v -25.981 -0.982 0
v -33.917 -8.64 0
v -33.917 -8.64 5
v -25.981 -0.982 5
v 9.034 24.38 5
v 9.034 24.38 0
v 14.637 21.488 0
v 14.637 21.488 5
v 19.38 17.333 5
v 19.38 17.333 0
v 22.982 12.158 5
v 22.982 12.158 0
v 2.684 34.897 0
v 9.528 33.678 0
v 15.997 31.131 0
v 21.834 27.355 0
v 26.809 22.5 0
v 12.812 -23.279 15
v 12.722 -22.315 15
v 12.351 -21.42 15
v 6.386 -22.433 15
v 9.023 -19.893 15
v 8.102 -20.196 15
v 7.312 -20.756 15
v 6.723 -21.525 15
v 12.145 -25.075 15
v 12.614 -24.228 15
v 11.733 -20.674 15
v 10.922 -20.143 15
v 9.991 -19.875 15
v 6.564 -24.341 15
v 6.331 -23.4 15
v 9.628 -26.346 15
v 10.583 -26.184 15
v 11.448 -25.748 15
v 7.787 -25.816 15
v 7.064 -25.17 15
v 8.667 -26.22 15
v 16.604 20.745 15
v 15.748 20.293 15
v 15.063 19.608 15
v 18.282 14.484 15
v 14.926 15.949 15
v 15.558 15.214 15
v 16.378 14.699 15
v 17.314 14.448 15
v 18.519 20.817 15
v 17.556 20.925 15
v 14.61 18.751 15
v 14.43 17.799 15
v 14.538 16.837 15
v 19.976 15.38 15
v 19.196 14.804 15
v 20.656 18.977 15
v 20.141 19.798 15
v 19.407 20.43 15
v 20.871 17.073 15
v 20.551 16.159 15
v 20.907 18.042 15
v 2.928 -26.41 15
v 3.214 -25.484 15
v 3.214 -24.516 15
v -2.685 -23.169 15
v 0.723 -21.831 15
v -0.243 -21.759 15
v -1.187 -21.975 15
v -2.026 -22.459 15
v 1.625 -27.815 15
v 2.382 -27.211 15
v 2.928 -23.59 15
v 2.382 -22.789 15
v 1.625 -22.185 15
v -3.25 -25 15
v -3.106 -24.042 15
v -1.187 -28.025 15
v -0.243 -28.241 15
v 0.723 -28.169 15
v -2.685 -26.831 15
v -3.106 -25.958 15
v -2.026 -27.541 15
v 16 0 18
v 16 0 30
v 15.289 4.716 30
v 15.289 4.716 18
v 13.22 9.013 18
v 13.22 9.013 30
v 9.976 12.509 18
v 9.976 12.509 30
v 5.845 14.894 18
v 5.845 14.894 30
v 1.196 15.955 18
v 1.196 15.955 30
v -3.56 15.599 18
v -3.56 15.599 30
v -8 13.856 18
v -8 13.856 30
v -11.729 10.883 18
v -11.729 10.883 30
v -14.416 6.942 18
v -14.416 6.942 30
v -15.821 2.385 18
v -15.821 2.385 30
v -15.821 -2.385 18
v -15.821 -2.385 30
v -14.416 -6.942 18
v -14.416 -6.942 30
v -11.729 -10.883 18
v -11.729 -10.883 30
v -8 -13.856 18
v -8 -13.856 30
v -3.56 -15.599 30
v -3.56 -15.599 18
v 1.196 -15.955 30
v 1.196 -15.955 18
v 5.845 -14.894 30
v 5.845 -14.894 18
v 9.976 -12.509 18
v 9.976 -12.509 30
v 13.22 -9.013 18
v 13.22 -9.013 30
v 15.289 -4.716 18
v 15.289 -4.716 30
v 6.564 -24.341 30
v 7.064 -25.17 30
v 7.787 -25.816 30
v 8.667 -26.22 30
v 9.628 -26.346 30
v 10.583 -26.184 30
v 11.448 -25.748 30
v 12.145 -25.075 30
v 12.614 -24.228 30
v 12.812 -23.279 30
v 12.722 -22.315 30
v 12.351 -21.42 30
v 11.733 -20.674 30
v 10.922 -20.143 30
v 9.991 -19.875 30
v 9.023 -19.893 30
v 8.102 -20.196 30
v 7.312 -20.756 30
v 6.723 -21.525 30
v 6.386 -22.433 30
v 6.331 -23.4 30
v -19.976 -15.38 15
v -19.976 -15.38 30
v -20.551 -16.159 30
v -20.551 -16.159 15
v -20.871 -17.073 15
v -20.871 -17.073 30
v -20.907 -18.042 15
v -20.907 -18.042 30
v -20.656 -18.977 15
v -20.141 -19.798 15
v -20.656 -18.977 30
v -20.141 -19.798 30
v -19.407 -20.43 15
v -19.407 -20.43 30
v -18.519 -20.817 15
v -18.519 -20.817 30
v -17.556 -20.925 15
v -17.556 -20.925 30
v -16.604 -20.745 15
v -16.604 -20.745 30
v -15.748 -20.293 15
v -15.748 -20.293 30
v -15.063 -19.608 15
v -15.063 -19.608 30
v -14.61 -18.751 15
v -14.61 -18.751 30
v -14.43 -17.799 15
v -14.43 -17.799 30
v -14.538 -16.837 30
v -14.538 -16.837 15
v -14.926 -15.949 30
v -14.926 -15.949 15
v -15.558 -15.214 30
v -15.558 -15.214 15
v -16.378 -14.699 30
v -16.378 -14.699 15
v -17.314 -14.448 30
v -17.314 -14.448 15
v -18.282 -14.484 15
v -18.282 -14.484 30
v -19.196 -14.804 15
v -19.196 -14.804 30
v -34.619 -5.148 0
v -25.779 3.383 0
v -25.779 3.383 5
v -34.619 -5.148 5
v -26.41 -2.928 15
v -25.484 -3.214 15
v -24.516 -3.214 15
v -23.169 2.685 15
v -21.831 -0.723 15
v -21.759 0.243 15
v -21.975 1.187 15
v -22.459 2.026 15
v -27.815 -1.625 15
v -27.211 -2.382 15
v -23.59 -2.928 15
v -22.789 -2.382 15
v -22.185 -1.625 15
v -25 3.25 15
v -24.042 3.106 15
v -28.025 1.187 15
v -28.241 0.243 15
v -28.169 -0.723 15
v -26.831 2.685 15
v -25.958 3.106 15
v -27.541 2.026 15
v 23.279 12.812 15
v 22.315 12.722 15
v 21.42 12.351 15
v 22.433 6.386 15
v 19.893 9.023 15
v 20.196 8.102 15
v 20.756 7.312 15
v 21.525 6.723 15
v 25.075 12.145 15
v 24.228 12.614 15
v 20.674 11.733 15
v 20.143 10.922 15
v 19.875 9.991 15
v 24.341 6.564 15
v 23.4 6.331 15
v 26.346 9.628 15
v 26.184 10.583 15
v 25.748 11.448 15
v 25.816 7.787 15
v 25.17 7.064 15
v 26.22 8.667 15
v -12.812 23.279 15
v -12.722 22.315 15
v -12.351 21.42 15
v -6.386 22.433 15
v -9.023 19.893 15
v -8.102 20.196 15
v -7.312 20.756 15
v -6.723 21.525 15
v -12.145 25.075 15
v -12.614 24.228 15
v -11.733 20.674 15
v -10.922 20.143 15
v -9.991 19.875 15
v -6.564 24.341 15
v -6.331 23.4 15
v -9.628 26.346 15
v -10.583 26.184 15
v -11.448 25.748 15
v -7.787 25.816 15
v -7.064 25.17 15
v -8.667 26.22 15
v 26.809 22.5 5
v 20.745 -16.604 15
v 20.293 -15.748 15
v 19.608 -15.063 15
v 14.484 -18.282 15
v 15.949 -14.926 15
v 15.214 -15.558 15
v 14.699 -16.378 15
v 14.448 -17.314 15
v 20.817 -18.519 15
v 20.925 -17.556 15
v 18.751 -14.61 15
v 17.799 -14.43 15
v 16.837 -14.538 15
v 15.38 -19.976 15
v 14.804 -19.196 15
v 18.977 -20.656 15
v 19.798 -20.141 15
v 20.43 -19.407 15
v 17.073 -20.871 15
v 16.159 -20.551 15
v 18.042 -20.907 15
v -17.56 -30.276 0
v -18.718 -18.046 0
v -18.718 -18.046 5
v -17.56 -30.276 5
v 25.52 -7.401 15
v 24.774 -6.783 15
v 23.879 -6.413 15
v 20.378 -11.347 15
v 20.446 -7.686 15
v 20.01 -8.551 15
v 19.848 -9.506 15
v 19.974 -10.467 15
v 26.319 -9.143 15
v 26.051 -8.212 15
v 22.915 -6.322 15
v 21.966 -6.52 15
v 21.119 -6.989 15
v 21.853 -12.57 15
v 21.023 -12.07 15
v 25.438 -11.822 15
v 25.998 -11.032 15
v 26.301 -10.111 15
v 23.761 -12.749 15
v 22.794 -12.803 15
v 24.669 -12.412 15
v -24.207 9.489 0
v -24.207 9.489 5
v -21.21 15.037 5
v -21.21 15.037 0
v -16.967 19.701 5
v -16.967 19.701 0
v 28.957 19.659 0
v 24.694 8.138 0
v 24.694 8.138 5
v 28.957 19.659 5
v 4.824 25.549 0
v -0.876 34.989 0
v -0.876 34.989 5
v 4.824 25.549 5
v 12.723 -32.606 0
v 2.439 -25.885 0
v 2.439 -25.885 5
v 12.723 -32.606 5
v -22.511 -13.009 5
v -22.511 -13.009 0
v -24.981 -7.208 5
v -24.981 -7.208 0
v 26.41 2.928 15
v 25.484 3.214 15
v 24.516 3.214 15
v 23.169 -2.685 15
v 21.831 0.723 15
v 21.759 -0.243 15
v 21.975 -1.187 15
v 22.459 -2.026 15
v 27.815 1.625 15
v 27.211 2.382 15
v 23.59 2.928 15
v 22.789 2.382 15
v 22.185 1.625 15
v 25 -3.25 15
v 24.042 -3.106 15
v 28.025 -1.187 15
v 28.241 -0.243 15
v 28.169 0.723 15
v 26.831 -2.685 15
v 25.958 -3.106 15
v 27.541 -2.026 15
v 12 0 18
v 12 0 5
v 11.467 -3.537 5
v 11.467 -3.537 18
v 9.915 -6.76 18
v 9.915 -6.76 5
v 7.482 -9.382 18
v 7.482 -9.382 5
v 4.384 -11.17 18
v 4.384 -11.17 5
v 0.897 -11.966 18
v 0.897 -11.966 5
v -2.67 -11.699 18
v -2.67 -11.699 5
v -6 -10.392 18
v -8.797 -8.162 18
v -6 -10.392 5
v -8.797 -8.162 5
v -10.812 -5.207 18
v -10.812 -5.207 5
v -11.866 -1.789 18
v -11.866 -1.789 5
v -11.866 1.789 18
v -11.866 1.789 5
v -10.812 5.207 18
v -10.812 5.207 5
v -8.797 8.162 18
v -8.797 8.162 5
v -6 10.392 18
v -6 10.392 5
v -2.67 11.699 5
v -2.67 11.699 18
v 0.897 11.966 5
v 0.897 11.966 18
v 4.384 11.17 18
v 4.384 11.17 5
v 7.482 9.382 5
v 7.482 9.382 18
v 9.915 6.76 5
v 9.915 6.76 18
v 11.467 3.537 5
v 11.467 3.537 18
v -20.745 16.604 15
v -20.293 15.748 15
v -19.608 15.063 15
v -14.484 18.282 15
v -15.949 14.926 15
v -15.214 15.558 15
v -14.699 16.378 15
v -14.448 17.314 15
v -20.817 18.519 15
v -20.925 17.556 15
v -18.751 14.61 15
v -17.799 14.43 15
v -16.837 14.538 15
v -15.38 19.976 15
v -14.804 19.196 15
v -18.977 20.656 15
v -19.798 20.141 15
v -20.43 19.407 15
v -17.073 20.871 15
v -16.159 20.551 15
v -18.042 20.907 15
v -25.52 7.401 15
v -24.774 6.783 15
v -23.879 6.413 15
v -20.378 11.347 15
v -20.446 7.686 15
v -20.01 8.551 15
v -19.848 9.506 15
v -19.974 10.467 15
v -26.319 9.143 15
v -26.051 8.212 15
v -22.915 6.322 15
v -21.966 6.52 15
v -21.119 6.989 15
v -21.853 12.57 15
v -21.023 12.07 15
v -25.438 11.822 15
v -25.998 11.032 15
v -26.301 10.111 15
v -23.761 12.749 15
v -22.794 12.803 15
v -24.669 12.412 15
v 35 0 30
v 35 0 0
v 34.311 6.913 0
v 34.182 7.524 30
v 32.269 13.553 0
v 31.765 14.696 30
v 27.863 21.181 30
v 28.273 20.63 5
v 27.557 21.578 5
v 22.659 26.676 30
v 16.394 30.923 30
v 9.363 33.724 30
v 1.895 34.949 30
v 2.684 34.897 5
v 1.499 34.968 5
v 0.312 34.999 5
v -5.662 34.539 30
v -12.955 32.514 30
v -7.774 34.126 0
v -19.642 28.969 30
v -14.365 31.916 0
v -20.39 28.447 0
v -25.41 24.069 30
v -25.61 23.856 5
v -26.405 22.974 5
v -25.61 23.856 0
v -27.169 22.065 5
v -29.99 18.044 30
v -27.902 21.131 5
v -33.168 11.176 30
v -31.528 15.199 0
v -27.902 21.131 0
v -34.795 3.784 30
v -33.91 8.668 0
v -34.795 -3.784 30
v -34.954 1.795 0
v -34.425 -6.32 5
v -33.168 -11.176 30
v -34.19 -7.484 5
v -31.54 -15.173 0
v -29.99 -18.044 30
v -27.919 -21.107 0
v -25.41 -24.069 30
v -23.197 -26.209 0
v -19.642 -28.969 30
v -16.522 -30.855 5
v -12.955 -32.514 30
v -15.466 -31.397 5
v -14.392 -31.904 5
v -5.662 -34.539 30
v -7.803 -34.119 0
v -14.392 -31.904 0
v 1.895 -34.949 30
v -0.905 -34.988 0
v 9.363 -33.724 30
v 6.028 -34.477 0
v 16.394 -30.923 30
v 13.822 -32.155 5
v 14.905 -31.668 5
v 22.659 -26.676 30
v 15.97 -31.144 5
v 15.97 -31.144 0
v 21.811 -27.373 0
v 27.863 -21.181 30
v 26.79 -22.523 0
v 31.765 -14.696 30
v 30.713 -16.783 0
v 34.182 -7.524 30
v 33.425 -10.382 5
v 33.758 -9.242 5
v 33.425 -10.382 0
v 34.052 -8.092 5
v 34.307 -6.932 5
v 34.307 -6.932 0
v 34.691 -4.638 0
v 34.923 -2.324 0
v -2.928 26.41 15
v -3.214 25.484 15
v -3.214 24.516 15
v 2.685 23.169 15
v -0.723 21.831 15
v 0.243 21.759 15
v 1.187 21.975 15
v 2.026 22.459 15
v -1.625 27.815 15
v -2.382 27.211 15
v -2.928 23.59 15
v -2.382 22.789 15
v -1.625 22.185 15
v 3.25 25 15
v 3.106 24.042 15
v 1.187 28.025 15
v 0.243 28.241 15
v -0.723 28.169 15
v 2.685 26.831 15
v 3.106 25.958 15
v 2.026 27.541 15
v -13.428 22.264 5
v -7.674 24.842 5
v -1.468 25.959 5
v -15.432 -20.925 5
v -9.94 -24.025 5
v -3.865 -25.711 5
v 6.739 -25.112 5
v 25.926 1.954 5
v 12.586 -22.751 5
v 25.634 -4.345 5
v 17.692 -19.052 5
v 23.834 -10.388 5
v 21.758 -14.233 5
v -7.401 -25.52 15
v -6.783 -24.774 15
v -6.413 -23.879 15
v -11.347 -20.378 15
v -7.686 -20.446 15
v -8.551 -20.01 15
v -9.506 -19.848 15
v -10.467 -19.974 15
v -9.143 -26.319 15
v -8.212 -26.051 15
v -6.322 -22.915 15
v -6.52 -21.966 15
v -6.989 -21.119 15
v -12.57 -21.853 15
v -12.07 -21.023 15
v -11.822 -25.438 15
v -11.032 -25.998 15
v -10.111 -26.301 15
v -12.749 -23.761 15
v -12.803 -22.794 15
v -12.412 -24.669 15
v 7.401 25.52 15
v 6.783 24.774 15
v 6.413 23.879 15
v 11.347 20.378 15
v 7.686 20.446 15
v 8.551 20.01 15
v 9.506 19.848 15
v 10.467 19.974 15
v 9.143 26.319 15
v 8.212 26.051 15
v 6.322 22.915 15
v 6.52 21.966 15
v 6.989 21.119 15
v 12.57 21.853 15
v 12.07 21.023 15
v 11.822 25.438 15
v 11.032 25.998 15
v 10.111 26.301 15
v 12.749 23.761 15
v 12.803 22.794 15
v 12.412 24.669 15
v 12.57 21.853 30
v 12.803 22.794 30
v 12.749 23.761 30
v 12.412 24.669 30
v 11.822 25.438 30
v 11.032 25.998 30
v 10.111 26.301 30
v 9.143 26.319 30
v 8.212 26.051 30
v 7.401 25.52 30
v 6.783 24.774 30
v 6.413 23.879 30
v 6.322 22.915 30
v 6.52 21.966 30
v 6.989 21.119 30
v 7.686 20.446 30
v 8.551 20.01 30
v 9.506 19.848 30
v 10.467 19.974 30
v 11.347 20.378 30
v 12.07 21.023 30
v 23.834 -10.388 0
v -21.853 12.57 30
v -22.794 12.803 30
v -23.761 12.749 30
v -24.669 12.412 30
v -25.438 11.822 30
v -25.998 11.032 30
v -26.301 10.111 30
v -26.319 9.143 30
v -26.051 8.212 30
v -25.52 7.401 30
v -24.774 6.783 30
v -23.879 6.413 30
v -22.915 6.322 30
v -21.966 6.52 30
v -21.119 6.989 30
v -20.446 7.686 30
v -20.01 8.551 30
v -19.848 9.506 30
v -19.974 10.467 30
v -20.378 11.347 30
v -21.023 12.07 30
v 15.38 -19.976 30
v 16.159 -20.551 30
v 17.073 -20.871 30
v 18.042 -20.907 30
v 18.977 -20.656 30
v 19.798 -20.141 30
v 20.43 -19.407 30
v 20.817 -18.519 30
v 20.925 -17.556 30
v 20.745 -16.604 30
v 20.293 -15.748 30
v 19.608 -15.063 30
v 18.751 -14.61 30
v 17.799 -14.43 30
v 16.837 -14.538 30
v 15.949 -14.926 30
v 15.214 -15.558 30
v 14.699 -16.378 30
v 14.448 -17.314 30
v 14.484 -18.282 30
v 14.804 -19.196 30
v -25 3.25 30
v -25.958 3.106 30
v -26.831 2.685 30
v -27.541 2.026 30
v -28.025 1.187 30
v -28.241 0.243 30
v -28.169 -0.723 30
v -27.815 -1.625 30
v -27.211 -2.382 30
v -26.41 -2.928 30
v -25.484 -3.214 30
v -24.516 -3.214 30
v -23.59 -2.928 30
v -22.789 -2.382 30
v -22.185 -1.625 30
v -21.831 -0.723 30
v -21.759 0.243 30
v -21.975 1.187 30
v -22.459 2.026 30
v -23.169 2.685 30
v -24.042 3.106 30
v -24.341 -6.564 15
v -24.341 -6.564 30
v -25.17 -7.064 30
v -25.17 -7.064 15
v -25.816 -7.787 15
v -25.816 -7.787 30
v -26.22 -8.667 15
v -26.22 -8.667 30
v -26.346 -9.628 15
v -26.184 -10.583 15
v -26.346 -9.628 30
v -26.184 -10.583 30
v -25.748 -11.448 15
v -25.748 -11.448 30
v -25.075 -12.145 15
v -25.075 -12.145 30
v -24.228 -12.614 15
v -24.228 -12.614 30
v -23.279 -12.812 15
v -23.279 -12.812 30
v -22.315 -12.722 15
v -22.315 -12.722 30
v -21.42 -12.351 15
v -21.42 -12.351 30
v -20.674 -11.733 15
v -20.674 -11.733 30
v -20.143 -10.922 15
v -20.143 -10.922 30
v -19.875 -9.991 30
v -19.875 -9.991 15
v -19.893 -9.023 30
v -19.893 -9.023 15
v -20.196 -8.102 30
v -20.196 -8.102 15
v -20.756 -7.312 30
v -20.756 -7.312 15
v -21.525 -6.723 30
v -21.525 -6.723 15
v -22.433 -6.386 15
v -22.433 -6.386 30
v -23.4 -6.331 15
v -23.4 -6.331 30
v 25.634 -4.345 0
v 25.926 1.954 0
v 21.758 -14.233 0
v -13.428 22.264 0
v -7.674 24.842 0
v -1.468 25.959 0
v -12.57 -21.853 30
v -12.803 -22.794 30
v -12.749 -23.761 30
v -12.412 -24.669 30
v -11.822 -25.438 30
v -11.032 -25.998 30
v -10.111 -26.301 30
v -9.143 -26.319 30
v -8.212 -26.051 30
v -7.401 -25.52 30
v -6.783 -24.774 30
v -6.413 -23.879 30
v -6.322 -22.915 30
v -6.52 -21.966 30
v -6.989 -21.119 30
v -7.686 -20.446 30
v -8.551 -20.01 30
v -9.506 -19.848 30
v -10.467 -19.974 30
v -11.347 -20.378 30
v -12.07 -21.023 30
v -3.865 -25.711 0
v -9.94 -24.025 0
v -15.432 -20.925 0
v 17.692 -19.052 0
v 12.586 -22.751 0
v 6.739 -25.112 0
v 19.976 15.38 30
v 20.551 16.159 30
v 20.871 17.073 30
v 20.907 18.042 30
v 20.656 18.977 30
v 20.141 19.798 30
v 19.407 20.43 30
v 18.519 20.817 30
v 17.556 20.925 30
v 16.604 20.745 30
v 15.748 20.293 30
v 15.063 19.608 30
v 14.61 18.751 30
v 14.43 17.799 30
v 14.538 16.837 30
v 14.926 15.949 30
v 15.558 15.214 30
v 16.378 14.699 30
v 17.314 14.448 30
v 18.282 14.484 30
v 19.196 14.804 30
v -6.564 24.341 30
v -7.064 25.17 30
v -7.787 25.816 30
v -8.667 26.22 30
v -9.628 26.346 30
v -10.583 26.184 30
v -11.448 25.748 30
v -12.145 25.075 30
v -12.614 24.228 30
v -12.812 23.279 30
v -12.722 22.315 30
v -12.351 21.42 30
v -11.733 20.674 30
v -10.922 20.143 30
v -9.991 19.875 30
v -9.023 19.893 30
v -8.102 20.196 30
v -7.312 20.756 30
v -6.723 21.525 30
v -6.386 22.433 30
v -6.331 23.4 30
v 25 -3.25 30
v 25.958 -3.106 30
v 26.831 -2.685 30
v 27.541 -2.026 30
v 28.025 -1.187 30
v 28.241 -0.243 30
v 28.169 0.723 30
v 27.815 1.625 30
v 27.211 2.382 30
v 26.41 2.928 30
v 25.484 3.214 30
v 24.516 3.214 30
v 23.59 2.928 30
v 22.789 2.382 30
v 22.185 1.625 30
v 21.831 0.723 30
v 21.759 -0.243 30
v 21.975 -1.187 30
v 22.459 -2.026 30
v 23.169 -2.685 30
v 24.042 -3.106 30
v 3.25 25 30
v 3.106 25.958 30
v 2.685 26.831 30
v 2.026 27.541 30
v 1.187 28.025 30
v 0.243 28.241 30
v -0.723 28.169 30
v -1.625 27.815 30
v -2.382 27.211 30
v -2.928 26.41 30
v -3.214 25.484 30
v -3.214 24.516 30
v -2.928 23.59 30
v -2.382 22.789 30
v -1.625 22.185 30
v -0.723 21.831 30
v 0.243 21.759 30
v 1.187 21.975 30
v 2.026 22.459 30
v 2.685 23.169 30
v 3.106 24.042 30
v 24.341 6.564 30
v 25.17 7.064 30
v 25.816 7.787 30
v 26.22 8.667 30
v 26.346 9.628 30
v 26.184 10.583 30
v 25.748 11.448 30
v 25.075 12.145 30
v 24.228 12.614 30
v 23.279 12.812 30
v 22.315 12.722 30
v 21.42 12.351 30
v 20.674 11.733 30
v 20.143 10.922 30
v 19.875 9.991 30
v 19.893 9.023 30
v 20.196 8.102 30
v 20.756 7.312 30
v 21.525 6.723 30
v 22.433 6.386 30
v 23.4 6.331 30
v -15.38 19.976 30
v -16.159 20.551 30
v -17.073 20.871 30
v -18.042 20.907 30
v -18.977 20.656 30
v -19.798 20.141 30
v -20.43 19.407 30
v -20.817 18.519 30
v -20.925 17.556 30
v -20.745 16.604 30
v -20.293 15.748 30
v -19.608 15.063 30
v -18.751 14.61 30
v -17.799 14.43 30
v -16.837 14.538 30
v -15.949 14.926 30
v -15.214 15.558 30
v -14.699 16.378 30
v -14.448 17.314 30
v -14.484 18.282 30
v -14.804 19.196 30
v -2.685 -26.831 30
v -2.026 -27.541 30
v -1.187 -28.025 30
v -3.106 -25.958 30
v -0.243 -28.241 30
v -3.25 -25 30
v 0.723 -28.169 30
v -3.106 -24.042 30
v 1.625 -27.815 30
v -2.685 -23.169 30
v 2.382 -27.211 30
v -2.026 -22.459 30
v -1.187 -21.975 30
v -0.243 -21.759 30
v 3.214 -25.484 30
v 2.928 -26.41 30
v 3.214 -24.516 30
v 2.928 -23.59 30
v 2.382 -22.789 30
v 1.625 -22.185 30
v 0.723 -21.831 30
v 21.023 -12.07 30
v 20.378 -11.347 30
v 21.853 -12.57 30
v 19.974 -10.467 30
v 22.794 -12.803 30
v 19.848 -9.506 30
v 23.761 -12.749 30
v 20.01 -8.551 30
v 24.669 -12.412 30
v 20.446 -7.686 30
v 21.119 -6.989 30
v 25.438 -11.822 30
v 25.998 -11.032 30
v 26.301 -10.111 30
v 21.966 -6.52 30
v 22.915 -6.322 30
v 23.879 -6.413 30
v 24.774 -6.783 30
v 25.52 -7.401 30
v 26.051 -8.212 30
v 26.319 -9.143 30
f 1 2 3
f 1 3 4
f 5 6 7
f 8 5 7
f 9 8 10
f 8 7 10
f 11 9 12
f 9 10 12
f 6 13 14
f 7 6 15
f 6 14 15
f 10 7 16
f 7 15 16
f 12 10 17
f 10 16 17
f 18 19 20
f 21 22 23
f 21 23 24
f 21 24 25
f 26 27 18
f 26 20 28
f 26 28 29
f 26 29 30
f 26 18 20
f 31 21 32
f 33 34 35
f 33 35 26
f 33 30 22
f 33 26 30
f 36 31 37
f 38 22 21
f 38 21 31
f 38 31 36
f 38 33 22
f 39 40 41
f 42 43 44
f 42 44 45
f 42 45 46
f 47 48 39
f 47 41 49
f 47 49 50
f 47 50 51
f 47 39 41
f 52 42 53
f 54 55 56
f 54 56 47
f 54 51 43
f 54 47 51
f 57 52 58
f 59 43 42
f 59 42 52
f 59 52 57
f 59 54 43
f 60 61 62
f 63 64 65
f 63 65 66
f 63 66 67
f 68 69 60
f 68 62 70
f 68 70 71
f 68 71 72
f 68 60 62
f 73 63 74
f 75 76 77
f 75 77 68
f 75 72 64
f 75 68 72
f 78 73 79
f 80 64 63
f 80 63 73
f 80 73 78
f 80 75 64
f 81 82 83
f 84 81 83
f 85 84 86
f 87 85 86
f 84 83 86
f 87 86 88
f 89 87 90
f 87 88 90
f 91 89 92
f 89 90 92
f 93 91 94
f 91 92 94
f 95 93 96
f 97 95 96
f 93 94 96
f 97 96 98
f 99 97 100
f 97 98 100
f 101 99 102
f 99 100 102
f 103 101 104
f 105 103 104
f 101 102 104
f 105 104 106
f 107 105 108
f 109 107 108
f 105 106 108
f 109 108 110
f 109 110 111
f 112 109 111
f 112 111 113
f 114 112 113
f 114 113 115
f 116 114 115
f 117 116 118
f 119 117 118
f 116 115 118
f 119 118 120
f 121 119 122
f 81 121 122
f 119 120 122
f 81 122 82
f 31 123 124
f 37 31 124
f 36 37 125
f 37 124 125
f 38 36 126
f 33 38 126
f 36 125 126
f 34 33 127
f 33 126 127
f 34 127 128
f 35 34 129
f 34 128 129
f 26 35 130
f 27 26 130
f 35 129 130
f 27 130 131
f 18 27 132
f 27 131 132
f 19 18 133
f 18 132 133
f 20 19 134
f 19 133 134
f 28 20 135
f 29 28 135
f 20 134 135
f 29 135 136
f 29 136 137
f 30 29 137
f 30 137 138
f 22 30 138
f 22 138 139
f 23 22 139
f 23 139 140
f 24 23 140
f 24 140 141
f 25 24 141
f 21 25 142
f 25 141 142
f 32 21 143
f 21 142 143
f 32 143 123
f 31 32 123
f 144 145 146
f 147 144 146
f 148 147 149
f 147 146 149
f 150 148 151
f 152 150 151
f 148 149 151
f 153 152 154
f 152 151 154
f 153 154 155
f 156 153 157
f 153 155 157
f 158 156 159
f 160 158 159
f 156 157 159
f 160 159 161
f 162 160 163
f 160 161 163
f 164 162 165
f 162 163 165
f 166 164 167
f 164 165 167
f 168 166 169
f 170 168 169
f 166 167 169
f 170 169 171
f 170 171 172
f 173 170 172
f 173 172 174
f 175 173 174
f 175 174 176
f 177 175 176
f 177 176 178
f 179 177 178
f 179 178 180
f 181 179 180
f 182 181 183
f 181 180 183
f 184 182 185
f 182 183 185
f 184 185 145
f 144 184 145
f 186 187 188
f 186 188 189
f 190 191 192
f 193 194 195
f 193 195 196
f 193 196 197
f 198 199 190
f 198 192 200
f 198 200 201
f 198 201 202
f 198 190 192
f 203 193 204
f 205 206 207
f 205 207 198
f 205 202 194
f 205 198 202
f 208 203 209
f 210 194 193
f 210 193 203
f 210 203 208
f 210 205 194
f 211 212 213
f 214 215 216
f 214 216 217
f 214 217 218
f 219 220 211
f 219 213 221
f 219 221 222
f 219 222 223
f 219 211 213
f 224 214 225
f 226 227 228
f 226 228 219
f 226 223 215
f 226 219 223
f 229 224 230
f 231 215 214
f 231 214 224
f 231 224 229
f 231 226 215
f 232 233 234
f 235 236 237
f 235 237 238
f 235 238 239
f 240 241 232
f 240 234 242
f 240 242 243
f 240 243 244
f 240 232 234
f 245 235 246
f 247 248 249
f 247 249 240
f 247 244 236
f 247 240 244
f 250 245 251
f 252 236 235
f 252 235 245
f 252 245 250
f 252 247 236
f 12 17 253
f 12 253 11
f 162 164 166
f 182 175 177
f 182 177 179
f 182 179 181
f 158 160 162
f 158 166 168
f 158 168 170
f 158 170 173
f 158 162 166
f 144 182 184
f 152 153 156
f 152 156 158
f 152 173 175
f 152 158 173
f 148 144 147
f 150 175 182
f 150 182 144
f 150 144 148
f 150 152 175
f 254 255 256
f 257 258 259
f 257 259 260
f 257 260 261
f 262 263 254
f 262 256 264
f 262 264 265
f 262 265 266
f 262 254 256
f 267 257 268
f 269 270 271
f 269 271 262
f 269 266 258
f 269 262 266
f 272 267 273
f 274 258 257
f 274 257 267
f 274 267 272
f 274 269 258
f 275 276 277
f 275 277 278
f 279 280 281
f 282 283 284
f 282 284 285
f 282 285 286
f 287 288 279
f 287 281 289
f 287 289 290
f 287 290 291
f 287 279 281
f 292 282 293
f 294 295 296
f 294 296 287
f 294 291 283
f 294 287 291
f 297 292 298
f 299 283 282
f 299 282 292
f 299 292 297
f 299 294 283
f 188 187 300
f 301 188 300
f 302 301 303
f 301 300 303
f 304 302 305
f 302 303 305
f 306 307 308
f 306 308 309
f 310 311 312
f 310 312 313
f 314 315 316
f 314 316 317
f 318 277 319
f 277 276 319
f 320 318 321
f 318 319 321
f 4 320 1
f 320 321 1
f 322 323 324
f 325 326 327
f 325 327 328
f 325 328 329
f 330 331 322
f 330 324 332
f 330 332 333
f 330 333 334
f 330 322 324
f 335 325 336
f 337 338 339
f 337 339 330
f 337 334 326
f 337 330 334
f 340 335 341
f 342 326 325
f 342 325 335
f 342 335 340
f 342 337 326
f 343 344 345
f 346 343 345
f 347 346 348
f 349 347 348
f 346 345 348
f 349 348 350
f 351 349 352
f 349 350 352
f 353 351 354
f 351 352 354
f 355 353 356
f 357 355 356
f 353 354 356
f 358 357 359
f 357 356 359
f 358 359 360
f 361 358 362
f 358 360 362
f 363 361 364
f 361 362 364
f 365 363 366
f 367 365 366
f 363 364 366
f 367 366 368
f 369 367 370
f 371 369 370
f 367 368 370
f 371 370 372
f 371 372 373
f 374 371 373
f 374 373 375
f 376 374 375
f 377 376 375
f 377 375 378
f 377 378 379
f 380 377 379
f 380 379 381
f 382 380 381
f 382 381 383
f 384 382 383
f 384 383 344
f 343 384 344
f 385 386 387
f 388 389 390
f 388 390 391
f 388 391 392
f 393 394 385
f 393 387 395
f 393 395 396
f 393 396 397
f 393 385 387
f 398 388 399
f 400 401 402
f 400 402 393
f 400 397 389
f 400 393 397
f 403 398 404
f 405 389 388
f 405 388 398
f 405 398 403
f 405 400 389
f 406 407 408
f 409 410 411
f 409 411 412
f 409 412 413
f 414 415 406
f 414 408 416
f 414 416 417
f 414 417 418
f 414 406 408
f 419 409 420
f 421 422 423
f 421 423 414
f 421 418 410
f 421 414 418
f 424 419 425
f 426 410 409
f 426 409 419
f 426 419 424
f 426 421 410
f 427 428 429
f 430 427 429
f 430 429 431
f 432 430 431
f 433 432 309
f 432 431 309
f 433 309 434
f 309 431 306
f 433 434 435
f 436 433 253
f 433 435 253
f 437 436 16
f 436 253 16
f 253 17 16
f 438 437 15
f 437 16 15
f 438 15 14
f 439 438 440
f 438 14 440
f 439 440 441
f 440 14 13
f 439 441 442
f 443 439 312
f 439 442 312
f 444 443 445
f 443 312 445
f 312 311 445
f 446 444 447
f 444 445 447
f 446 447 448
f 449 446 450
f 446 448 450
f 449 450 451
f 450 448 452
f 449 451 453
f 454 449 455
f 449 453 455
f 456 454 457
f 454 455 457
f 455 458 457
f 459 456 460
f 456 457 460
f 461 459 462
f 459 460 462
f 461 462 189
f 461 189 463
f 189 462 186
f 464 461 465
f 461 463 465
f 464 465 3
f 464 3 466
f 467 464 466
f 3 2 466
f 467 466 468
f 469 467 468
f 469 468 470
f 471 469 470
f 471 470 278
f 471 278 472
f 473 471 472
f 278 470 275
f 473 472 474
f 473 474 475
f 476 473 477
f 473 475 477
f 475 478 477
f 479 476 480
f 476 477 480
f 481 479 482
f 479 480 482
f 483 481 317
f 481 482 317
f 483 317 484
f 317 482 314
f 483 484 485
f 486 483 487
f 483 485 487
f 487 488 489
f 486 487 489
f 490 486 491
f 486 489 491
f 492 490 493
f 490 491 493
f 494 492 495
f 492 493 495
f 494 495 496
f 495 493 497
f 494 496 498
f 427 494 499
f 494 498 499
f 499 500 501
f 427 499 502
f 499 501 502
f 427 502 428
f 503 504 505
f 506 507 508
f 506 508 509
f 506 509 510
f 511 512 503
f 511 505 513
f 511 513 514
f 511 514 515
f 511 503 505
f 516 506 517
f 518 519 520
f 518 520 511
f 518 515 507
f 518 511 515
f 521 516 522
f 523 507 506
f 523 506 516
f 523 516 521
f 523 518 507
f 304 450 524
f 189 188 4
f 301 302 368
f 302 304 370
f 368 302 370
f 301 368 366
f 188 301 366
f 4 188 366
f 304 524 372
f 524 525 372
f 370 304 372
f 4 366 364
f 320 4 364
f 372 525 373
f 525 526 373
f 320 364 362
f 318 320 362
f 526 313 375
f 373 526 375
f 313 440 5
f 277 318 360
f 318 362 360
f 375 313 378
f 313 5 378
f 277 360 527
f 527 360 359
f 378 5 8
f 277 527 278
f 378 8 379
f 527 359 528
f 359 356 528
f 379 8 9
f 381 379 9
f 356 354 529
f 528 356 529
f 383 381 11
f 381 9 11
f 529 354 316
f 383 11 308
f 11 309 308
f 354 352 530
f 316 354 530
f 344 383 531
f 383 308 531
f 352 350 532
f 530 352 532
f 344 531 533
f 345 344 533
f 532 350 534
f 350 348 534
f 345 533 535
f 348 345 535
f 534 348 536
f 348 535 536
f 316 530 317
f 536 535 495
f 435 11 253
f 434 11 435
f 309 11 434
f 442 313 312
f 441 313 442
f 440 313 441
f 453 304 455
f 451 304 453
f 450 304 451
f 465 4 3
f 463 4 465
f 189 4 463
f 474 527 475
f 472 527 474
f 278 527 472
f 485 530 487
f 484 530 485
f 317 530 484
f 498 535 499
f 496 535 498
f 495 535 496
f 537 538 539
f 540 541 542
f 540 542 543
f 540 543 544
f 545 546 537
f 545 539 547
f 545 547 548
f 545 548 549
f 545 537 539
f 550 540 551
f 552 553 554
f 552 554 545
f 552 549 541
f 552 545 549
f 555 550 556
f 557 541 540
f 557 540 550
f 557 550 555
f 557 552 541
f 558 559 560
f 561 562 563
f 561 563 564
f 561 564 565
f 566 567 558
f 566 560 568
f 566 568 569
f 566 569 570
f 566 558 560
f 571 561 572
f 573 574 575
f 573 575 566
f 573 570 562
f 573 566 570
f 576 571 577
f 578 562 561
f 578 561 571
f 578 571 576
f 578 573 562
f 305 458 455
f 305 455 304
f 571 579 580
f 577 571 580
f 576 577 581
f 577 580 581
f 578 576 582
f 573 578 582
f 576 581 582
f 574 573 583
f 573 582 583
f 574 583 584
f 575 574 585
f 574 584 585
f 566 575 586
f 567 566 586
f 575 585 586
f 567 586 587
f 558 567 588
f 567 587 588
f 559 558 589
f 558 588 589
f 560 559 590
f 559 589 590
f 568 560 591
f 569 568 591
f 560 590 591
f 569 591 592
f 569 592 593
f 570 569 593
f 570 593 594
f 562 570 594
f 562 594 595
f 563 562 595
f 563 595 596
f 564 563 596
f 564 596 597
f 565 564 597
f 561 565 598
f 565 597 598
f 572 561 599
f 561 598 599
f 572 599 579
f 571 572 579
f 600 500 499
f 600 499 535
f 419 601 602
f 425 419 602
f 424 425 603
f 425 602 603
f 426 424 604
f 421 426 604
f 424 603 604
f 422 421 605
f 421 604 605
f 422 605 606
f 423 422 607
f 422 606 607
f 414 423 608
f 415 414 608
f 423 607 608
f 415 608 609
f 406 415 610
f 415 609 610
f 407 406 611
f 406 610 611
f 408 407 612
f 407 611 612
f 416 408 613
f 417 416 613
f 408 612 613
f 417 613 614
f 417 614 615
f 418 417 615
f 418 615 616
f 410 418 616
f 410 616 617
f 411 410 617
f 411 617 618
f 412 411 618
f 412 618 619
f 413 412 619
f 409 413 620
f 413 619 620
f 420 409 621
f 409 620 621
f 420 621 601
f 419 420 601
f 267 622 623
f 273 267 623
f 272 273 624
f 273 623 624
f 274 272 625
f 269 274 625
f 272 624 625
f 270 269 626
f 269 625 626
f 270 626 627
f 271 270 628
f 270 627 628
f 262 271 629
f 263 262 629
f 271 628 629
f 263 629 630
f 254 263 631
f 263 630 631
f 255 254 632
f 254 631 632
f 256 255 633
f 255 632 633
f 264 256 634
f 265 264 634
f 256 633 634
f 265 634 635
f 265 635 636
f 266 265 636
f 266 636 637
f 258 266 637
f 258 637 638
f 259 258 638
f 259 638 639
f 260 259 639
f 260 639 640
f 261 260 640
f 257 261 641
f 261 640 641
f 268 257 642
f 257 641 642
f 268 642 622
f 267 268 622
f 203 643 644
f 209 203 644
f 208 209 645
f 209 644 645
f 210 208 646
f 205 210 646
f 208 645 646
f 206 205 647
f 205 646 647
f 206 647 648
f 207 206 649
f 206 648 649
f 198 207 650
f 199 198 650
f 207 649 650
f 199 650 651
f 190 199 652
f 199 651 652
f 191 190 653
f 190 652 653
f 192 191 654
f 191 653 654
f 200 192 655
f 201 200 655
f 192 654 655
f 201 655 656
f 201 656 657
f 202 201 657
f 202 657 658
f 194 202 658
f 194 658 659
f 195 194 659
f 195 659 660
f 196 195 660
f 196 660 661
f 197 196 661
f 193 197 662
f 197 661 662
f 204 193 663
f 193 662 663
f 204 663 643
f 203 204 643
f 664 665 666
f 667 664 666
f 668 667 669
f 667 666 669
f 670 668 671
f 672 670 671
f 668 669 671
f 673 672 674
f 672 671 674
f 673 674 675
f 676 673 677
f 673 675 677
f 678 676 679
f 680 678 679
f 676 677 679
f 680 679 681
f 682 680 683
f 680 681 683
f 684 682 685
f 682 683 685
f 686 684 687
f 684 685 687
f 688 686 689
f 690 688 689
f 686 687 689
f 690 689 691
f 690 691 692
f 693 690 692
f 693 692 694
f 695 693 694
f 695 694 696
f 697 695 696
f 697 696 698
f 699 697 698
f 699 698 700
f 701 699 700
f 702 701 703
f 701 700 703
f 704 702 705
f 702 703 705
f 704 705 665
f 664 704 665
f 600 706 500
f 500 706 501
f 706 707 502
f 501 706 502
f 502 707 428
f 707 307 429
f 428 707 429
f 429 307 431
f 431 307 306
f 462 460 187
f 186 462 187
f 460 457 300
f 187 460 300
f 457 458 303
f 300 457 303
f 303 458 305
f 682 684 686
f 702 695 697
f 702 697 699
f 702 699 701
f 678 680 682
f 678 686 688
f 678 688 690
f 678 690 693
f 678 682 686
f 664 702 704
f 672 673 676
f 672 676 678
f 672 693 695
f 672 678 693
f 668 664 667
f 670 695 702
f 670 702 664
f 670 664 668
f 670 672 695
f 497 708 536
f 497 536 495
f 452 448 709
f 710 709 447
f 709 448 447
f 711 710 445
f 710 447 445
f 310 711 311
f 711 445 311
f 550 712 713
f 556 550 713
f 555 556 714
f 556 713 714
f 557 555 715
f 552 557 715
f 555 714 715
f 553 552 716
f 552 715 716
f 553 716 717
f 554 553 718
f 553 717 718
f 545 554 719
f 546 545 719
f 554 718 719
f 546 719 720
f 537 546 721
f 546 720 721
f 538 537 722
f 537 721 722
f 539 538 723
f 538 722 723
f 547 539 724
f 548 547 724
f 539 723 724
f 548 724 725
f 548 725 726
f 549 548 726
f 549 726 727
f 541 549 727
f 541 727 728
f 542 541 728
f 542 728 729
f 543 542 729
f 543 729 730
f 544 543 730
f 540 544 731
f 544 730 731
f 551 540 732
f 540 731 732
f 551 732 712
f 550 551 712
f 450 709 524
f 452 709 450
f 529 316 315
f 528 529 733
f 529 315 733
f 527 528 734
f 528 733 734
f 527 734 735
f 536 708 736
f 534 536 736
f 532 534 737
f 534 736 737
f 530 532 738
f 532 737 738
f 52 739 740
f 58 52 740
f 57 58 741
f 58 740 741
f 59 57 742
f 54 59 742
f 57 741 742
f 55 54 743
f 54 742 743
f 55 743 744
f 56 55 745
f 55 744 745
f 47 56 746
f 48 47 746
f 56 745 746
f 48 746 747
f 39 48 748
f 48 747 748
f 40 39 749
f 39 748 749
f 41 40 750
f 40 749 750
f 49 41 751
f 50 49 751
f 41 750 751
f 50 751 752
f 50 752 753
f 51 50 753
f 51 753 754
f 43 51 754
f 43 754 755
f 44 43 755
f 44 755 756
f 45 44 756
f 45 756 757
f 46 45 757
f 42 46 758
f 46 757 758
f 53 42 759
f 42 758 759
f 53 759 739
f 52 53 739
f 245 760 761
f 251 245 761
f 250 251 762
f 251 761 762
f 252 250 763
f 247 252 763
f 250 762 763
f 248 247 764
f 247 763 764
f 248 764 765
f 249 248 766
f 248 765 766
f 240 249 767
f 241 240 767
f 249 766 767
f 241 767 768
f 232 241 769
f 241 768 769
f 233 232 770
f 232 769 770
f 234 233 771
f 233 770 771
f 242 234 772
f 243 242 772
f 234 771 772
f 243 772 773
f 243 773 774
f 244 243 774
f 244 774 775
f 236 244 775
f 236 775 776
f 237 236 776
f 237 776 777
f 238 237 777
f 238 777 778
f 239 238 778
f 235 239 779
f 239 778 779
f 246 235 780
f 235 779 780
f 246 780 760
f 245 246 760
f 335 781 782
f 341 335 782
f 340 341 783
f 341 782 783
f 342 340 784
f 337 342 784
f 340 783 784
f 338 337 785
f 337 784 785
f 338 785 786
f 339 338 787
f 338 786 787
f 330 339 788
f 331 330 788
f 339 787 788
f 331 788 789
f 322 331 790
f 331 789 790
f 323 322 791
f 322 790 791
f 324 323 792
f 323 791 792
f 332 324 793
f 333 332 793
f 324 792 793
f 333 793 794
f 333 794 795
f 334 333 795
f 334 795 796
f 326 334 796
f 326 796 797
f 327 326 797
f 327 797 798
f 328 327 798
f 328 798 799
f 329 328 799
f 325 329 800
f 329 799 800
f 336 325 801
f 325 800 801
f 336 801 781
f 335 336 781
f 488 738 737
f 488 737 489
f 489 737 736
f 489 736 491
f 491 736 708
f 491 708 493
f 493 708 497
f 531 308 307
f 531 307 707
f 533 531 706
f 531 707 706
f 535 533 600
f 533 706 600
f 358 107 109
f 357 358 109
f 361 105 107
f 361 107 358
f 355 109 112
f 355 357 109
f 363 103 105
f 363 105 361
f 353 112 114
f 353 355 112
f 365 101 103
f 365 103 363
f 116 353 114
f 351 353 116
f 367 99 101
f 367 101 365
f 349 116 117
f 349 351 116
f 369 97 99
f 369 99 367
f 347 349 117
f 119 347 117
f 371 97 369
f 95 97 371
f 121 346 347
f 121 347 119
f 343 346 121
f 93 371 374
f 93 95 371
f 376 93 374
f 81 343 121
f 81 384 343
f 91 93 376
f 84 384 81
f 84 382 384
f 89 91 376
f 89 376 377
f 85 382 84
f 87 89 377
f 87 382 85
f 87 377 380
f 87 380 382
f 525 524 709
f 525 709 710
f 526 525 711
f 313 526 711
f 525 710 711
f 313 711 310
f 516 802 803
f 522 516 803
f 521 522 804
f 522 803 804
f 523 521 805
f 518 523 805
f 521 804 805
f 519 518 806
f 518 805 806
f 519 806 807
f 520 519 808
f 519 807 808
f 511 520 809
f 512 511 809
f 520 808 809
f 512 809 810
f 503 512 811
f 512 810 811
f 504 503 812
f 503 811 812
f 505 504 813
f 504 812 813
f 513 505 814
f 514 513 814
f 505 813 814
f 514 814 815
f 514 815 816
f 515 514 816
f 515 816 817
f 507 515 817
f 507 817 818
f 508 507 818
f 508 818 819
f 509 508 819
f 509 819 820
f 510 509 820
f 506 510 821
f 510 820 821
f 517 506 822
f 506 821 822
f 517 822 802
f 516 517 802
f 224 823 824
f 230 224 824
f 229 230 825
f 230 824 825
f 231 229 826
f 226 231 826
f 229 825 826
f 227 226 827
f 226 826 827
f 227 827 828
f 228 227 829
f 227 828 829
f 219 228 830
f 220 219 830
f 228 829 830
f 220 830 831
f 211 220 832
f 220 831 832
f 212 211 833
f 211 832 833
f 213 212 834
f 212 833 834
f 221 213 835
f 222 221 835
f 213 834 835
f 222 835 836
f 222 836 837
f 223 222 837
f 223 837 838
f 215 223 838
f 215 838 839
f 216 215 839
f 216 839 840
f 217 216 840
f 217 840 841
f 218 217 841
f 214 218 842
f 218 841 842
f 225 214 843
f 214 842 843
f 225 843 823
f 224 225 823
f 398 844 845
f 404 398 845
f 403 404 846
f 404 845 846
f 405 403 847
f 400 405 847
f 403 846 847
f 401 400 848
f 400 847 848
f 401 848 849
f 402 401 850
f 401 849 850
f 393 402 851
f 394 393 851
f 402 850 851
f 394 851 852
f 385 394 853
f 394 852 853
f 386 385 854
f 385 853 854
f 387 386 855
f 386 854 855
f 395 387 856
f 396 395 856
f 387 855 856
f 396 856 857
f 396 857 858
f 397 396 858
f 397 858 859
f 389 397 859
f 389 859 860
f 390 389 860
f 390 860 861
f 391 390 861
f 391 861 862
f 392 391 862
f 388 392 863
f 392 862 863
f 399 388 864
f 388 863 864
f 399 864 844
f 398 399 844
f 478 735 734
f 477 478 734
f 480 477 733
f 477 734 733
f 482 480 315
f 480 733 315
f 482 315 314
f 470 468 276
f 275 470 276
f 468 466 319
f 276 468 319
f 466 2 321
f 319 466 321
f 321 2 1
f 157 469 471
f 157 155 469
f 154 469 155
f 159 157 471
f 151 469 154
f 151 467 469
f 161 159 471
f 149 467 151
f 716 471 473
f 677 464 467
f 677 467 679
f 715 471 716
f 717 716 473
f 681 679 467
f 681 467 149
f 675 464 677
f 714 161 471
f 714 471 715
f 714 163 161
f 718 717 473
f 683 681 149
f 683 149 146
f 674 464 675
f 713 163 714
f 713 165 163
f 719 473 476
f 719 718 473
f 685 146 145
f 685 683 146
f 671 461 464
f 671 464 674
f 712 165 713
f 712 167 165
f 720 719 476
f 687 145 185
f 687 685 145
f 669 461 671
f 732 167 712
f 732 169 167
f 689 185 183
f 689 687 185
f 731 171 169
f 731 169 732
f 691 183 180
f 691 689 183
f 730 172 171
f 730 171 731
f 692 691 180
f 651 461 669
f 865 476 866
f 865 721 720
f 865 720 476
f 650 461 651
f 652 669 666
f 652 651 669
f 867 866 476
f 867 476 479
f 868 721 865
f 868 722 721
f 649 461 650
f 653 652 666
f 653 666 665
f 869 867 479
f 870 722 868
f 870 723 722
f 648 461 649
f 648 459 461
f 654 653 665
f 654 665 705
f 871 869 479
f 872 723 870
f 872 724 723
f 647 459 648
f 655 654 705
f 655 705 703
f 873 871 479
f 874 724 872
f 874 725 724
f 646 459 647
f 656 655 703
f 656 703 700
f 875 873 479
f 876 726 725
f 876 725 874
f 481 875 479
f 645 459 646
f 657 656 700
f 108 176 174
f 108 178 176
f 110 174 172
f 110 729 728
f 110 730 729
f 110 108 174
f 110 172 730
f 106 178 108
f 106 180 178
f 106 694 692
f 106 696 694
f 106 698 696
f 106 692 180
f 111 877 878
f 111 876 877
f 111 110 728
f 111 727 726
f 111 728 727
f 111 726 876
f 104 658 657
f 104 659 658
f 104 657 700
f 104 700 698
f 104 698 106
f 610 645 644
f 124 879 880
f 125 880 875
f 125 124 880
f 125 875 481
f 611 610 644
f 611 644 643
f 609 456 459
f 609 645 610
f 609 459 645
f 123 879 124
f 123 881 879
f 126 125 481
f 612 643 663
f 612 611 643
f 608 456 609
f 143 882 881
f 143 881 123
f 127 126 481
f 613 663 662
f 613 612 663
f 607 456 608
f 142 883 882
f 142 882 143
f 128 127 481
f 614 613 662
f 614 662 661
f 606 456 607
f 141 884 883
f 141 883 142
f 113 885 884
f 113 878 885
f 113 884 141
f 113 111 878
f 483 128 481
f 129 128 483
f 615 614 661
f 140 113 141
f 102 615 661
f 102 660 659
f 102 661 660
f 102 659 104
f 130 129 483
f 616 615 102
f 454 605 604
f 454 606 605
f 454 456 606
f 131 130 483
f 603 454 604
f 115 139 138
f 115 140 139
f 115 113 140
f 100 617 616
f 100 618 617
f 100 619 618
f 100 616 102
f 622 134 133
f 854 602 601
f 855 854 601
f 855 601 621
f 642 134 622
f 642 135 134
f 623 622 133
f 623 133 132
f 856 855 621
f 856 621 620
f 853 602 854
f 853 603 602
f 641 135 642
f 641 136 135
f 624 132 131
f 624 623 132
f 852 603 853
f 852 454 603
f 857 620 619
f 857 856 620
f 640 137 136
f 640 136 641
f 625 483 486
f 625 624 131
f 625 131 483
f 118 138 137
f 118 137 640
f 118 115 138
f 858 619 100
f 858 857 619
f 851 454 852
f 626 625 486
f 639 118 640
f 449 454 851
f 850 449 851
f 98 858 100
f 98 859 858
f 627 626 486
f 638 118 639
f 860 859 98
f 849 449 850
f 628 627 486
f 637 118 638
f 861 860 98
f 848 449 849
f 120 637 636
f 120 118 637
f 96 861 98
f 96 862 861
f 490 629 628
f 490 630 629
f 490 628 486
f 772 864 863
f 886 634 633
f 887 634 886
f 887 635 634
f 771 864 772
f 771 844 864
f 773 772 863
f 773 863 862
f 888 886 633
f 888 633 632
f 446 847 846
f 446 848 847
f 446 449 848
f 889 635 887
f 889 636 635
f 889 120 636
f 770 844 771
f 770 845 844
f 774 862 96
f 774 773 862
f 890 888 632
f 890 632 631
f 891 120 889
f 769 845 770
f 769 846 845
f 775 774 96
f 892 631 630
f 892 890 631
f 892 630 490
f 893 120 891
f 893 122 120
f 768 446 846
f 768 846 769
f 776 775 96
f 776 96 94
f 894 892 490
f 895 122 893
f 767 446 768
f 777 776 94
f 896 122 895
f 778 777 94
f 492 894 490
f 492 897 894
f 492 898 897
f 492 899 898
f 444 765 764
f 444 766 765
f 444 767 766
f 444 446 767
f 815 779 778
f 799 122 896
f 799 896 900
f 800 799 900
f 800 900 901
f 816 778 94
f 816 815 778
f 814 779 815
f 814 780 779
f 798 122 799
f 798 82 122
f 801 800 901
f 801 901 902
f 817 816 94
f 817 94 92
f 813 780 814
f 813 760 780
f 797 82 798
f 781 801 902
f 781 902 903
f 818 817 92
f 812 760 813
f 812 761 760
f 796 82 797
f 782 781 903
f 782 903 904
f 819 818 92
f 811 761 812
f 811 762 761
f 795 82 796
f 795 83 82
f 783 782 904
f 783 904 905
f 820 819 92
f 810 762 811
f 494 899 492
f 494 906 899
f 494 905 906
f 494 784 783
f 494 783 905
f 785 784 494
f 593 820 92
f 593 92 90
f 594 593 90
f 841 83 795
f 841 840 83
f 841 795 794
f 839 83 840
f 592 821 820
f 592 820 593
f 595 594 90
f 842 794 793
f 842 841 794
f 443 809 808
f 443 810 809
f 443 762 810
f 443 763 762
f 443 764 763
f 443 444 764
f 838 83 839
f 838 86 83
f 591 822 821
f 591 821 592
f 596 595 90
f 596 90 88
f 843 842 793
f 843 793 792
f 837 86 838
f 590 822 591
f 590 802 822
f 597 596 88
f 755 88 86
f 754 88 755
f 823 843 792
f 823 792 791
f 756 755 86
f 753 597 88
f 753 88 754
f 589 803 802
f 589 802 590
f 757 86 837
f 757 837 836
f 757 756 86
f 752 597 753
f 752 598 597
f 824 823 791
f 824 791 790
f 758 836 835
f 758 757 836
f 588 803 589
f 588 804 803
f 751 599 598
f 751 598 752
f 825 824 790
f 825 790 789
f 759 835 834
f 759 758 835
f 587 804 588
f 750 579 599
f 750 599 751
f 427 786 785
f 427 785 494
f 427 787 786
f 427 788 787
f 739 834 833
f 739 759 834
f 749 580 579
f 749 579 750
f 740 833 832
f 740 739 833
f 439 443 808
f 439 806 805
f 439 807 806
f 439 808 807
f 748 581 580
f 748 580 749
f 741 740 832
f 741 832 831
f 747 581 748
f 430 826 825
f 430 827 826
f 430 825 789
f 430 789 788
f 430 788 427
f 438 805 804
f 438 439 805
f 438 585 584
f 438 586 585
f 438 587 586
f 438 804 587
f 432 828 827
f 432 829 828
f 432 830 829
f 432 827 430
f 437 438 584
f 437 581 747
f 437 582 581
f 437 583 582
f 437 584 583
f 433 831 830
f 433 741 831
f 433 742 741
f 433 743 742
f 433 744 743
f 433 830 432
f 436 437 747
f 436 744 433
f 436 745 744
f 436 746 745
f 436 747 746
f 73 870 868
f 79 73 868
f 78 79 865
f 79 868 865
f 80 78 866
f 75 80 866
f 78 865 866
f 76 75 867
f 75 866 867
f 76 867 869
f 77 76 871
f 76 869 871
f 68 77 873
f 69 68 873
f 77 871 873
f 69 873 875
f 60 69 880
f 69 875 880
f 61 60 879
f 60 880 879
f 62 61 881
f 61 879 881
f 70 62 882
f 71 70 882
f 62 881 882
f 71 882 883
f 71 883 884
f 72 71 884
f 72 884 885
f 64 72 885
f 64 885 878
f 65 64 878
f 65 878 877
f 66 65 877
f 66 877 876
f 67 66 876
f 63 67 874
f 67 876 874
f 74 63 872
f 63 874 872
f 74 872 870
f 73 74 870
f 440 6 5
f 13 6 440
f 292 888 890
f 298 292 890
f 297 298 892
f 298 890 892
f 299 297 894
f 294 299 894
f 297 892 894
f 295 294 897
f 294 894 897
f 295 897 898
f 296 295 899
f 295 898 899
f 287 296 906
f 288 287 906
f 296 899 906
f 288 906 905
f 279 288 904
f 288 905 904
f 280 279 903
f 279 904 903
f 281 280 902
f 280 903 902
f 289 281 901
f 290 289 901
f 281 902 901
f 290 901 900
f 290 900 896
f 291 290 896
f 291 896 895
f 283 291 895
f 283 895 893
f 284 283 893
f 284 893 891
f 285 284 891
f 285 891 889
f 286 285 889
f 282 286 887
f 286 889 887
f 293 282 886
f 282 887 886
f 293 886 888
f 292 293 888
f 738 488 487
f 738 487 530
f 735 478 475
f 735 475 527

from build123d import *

# Parameters (mm, degrees)
SKETCH_R              = 35
PAD_DEPTH             = 30
SKETCH001_R           = 12
POCKET_DEPTH          = 30.001
SKETCH002_R           = 26
POCKET001_DEPTH       = 5
SKETCH003_R           = 3.25
POCKET002_DEPTH       = 15
POLARPATTERN_COUNT    = 16
SKETCH004_R           = 16
POCKET003_DEPTH       = 12
POCKET004_DEPTH       = 5
POLARPATTERN001_COUNT = 7


with BuildPart() as part:
    # Sketch → Pad (new body)
    with BuildSketch(Plane.XY):
        Circle(SKETCH_R)
    extrude(amount=PAD_DEPTH)

    # Sketch001 → Pocket (cut, through all)
    with BuildSketch(Plane(origin=(0, 0, 0), x_dir=(1, 0, 0), z_dir=(0, 0, -1))):
        Circle(SKETCH001_R)
    extrude(amount=-POCKET_DEPTH, mode=Mode.SUBTRACT)

    # Sketch002 → Pocket001 (cut)
    with BuildSketch(Plane(origin=(0, 0, 0), x_dir=(1, 0, 0), z_dir=(0, 0, -1))):
        Circle(SKETCH002_R)
    extrude(amount=-POCKET001_DEPTH, mode=Mode.SUBTRACT)

    # Sketch003 → Pocket002 (cut)
    with BuildSketch(Plane.XY.offset(30)):
        with Locations((0, 25)):
            Circle(SKETCH003_R)
    pocket002 = extrude(amount=-POCKET002_DEPTH, mode=Mode.SUBTRACT)

    # PolarPattern: Pocket002 ×16 about axis
    polarpattern_axis = Axis((0, 0, 30), (0, 0, 1))
    for i in range(1, POLARPATTERN_COUNT):
        add(pocket002.rotate(polarpattern_axis, i * 360 / POLARPATTERN_COUNT), mode=Mode.SUBTRACT)

    # Sketch004 → Pocket003 (cut)
    with BuildSketch(Plane.XY.offset(30)):
        Circle(SKETCH004_R)
    extrude(amount=-POCKET003_DEPTH, mode=Mode.SUBTRACT)

    # Sketch005 → Pocket004 (cut)
    with BuildSketch(Plane(origin=(0, 0, 0), x_dir=(1, 0, 0), z_dir=(0, 0, -1))):
        Polygon((19.471427, 37.015548), (21.112486, 34.504188), (-4.001108, 18.0936), (-5.642167, 20.604959), align=None)
    pocket004 = extrude(amount=-POCKET004_DEPTH, mode=Mode.SUBTRACT)

    # PolarPattern001: Pocket004 ×7 about axis
    polarpattern001_axis = Axis((0, 0, 0), (0, 0, -1))
    for i in range(1, POLARPATTERN001_COUNT):
        add(pocket004.rotate(polarpattern001_axis, i * 360 / POLARPATTERN001_COUNT), mode=Mode.SUBTRACT)


solid = part.part
